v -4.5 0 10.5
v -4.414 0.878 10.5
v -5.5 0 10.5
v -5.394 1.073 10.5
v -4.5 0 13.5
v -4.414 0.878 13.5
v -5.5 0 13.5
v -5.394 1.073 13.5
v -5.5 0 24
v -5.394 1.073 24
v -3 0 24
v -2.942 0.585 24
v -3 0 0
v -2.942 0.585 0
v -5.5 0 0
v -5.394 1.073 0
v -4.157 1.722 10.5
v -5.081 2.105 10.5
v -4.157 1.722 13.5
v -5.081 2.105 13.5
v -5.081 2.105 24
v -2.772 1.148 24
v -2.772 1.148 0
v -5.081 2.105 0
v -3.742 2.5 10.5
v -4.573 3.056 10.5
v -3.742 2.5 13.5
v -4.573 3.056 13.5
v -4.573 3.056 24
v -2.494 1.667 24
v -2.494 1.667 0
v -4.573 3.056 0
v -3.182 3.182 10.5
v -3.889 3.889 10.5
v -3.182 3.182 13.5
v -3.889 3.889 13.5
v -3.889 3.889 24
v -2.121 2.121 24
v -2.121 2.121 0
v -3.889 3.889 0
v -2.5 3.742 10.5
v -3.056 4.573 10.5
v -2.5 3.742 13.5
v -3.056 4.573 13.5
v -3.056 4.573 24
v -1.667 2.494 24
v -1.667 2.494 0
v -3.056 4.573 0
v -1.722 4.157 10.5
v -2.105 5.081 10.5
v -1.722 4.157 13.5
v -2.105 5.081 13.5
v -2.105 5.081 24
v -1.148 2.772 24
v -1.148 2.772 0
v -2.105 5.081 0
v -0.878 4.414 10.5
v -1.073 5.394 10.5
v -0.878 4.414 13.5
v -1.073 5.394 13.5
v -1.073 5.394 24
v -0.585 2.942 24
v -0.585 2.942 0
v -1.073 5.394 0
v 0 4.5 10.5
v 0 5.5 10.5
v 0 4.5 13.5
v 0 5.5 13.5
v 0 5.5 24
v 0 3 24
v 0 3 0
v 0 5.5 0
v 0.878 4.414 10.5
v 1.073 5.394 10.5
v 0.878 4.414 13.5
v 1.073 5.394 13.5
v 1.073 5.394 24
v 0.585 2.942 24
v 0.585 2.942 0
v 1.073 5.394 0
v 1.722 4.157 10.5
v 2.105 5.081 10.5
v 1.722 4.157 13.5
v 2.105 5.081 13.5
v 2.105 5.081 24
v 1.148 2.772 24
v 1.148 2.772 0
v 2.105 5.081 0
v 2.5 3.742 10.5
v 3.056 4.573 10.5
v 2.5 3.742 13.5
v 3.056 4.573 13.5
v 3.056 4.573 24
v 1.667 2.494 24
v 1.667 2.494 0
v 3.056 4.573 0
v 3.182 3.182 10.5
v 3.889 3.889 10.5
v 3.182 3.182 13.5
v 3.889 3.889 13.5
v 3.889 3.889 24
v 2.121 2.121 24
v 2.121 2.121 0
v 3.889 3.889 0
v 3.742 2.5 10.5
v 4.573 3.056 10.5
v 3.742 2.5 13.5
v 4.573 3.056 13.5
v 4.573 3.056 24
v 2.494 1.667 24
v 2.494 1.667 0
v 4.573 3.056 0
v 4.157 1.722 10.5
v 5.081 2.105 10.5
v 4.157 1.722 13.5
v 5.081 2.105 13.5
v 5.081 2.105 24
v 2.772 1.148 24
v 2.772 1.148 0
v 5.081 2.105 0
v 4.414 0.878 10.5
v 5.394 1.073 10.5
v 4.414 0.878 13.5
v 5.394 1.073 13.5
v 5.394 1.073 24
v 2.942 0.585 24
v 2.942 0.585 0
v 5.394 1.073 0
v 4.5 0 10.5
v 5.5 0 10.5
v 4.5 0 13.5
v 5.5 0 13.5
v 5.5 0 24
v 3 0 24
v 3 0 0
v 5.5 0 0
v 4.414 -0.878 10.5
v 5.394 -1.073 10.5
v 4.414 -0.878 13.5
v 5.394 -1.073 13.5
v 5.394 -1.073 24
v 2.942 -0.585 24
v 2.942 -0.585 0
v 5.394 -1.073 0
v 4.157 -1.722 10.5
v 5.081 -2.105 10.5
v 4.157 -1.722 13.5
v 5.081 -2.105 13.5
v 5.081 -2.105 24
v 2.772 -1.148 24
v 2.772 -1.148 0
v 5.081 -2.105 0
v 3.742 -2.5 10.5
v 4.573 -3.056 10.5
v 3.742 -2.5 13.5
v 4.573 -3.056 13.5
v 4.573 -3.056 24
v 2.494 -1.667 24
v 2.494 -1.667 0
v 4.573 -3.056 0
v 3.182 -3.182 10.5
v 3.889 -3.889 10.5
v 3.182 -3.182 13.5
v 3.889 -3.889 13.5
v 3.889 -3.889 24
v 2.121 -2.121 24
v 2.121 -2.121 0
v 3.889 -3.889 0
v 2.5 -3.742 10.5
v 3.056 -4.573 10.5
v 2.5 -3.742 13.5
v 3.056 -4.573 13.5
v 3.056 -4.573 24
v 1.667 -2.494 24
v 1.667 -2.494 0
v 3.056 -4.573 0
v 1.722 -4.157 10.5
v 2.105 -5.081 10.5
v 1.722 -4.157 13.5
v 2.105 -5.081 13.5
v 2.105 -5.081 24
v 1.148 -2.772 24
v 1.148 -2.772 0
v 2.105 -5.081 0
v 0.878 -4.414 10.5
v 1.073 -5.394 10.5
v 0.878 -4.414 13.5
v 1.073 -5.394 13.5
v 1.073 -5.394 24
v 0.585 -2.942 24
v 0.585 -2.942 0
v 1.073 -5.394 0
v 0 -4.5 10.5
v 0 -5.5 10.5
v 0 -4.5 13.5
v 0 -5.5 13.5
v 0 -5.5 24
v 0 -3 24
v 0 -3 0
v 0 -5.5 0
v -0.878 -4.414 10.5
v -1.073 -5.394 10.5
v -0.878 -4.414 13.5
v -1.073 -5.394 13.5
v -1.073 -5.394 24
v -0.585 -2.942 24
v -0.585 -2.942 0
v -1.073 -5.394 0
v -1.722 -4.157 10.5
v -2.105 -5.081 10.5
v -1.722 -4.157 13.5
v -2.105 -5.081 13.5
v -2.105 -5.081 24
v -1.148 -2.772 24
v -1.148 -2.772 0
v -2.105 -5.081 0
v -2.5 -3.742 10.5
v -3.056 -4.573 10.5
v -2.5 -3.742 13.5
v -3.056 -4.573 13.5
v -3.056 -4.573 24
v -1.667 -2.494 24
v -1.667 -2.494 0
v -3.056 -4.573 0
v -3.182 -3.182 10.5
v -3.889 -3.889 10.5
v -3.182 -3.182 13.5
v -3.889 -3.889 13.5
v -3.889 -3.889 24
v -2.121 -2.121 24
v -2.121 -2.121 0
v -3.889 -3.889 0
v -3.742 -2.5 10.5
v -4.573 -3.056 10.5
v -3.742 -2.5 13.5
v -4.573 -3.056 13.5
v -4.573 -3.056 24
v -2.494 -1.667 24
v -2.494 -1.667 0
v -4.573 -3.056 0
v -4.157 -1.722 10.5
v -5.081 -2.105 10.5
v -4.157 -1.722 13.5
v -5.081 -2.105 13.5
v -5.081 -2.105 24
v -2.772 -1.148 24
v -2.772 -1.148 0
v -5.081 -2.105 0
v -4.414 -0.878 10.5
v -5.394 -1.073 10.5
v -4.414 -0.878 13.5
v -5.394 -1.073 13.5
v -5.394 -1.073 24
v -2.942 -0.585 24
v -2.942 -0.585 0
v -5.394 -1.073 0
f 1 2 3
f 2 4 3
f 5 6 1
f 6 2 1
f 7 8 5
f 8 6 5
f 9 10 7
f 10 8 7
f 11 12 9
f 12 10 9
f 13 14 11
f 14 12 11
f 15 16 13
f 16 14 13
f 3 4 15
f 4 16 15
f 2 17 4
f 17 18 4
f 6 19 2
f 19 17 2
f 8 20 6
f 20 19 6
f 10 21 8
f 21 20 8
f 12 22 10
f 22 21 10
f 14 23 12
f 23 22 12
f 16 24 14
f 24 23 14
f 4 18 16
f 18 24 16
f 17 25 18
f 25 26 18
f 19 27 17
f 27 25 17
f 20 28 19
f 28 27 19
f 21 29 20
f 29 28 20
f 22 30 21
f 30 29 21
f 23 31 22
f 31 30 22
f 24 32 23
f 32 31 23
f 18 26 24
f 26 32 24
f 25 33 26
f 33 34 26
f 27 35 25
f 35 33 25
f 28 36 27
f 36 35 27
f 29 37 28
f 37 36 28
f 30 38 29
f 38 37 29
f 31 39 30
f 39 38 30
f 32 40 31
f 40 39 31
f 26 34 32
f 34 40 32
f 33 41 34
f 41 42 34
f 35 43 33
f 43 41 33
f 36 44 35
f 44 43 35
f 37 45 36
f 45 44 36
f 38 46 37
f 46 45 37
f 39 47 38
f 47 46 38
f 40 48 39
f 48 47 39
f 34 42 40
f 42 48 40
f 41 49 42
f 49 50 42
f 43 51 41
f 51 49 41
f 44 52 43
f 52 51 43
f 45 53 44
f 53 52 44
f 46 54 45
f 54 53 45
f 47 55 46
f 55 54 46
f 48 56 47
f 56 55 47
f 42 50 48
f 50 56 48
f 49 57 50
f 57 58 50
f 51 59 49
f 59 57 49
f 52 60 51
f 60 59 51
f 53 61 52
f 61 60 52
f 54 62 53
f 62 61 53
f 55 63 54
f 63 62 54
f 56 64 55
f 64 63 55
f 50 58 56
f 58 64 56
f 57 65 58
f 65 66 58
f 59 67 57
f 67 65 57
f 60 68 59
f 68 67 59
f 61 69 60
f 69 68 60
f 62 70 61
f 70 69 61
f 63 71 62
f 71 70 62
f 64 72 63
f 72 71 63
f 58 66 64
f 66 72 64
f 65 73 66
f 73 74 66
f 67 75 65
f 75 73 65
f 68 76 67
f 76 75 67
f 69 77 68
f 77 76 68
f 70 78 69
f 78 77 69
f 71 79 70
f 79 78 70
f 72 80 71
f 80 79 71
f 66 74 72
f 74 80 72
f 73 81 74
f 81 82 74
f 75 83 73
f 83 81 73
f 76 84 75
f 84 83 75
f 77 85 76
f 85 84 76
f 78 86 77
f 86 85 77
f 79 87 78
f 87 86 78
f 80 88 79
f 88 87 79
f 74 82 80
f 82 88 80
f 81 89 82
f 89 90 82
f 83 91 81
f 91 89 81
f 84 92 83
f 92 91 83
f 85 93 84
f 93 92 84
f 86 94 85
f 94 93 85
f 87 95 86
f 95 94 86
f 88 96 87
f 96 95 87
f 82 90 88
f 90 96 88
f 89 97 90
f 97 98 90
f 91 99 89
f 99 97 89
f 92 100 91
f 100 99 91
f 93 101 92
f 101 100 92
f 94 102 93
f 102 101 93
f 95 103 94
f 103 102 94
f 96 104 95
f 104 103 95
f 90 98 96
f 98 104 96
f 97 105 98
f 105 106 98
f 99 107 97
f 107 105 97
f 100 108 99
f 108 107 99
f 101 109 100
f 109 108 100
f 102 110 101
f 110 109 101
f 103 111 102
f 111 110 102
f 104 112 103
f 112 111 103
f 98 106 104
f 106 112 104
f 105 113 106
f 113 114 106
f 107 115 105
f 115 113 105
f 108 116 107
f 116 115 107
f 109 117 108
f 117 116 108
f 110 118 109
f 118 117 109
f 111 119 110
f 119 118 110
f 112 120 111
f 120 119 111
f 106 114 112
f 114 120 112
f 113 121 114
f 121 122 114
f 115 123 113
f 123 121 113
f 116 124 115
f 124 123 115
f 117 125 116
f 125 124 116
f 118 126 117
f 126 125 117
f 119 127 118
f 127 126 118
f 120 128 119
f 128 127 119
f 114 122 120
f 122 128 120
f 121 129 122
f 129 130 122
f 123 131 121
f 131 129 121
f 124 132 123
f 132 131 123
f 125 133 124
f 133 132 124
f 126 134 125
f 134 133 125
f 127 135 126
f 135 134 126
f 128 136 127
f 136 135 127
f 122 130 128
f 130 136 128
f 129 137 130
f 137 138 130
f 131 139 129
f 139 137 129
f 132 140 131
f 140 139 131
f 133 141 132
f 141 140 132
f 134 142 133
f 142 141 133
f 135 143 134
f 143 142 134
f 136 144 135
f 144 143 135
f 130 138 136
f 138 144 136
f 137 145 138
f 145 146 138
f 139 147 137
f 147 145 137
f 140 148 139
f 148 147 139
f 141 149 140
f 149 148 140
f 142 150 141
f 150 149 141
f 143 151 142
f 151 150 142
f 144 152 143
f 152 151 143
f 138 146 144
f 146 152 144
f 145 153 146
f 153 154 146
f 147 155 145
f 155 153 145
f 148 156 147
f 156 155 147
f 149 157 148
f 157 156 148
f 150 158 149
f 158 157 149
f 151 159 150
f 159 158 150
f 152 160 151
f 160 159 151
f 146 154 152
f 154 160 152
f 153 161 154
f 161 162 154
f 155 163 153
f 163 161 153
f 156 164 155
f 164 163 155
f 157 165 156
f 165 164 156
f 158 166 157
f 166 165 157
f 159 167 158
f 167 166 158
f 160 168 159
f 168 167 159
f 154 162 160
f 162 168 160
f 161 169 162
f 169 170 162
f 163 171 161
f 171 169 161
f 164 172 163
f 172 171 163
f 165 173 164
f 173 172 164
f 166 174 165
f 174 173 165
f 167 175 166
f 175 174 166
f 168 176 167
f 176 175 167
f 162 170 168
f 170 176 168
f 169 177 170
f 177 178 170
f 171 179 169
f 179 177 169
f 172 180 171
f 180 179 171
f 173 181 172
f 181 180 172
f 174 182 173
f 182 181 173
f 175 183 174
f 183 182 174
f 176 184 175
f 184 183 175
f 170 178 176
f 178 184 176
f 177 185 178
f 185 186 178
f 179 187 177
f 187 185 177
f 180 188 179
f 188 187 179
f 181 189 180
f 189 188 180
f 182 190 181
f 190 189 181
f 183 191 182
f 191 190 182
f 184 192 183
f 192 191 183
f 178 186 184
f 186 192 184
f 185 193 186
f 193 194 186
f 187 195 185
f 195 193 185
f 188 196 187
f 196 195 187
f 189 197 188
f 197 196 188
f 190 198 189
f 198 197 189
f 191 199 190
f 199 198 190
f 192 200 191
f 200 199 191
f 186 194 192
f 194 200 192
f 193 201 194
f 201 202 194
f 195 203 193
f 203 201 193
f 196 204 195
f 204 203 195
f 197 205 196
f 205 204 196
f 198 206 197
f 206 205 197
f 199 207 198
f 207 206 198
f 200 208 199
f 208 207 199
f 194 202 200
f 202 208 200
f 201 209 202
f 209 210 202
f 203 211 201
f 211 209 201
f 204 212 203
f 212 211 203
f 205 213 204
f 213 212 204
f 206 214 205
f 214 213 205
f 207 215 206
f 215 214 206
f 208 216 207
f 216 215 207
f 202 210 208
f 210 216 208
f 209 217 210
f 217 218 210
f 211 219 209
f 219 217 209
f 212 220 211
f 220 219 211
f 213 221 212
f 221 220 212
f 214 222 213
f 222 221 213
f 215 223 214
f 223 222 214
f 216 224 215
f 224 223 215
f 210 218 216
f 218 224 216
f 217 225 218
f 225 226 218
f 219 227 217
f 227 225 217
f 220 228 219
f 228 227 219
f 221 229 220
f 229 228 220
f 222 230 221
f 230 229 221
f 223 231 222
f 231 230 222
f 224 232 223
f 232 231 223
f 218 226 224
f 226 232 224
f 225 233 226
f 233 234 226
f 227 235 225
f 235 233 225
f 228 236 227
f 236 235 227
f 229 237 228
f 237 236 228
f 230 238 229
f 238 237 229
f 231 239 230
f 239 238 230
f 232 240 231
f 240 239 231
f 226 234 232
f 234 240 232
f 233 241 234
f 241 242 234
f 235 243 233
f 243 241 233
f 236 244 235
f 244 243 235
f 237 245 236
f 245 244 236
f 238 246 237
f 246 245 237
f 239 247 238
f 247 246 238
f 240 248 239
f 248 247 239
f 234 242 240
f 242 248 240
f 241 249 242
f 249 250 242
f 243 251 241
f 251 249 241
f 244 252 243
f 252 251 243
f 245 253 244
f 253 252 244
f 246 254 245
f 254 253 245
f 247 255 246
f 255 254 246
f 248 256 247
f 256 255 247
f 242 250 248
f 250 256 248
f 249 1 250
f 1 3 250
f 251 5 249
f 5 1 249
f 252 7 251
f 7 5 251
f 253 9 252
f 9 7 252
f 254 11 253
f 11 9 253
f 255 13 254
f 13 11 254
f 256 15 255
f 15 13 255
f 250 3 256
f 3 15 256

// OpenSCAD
$fn = 32;

// ----------------------------------------------------------------------
// Grooved revolve: stepped, bore R3
// ----------------------------------------------------------------------

// --- parameters (mm) ---
bore_r = 3;               // bore radius
outer_r = 5.5;            // outer radius of the body
total_h = 24;             // overall height, Z
wall = 2.5;               // radial wall thickness
groove_w = 3;             // groove width
groove_d = 1;             // groove depth
grooves = 1;              // number of outer grooves

bbox_x = 2 * outer_r;  // full diameter
bore_d = 2 * bore_r;  // bore diameter
body_d = 2 * outer_r;  // body diameter
revolve_angle = 360;  // full turn around the Z axis

profile = [[3, 0], [5.5, 0], [5.5, 10.5], [4.5, 10.5], [4.5, 13.5], [5.5, 13.5], [5.5, 24], [3, 24]];  // primary outline, 8 points, counter clockwise

// --- the one profile operation ---
rotate_extrude(angle = revolve_angle) polygon(points = profile);
